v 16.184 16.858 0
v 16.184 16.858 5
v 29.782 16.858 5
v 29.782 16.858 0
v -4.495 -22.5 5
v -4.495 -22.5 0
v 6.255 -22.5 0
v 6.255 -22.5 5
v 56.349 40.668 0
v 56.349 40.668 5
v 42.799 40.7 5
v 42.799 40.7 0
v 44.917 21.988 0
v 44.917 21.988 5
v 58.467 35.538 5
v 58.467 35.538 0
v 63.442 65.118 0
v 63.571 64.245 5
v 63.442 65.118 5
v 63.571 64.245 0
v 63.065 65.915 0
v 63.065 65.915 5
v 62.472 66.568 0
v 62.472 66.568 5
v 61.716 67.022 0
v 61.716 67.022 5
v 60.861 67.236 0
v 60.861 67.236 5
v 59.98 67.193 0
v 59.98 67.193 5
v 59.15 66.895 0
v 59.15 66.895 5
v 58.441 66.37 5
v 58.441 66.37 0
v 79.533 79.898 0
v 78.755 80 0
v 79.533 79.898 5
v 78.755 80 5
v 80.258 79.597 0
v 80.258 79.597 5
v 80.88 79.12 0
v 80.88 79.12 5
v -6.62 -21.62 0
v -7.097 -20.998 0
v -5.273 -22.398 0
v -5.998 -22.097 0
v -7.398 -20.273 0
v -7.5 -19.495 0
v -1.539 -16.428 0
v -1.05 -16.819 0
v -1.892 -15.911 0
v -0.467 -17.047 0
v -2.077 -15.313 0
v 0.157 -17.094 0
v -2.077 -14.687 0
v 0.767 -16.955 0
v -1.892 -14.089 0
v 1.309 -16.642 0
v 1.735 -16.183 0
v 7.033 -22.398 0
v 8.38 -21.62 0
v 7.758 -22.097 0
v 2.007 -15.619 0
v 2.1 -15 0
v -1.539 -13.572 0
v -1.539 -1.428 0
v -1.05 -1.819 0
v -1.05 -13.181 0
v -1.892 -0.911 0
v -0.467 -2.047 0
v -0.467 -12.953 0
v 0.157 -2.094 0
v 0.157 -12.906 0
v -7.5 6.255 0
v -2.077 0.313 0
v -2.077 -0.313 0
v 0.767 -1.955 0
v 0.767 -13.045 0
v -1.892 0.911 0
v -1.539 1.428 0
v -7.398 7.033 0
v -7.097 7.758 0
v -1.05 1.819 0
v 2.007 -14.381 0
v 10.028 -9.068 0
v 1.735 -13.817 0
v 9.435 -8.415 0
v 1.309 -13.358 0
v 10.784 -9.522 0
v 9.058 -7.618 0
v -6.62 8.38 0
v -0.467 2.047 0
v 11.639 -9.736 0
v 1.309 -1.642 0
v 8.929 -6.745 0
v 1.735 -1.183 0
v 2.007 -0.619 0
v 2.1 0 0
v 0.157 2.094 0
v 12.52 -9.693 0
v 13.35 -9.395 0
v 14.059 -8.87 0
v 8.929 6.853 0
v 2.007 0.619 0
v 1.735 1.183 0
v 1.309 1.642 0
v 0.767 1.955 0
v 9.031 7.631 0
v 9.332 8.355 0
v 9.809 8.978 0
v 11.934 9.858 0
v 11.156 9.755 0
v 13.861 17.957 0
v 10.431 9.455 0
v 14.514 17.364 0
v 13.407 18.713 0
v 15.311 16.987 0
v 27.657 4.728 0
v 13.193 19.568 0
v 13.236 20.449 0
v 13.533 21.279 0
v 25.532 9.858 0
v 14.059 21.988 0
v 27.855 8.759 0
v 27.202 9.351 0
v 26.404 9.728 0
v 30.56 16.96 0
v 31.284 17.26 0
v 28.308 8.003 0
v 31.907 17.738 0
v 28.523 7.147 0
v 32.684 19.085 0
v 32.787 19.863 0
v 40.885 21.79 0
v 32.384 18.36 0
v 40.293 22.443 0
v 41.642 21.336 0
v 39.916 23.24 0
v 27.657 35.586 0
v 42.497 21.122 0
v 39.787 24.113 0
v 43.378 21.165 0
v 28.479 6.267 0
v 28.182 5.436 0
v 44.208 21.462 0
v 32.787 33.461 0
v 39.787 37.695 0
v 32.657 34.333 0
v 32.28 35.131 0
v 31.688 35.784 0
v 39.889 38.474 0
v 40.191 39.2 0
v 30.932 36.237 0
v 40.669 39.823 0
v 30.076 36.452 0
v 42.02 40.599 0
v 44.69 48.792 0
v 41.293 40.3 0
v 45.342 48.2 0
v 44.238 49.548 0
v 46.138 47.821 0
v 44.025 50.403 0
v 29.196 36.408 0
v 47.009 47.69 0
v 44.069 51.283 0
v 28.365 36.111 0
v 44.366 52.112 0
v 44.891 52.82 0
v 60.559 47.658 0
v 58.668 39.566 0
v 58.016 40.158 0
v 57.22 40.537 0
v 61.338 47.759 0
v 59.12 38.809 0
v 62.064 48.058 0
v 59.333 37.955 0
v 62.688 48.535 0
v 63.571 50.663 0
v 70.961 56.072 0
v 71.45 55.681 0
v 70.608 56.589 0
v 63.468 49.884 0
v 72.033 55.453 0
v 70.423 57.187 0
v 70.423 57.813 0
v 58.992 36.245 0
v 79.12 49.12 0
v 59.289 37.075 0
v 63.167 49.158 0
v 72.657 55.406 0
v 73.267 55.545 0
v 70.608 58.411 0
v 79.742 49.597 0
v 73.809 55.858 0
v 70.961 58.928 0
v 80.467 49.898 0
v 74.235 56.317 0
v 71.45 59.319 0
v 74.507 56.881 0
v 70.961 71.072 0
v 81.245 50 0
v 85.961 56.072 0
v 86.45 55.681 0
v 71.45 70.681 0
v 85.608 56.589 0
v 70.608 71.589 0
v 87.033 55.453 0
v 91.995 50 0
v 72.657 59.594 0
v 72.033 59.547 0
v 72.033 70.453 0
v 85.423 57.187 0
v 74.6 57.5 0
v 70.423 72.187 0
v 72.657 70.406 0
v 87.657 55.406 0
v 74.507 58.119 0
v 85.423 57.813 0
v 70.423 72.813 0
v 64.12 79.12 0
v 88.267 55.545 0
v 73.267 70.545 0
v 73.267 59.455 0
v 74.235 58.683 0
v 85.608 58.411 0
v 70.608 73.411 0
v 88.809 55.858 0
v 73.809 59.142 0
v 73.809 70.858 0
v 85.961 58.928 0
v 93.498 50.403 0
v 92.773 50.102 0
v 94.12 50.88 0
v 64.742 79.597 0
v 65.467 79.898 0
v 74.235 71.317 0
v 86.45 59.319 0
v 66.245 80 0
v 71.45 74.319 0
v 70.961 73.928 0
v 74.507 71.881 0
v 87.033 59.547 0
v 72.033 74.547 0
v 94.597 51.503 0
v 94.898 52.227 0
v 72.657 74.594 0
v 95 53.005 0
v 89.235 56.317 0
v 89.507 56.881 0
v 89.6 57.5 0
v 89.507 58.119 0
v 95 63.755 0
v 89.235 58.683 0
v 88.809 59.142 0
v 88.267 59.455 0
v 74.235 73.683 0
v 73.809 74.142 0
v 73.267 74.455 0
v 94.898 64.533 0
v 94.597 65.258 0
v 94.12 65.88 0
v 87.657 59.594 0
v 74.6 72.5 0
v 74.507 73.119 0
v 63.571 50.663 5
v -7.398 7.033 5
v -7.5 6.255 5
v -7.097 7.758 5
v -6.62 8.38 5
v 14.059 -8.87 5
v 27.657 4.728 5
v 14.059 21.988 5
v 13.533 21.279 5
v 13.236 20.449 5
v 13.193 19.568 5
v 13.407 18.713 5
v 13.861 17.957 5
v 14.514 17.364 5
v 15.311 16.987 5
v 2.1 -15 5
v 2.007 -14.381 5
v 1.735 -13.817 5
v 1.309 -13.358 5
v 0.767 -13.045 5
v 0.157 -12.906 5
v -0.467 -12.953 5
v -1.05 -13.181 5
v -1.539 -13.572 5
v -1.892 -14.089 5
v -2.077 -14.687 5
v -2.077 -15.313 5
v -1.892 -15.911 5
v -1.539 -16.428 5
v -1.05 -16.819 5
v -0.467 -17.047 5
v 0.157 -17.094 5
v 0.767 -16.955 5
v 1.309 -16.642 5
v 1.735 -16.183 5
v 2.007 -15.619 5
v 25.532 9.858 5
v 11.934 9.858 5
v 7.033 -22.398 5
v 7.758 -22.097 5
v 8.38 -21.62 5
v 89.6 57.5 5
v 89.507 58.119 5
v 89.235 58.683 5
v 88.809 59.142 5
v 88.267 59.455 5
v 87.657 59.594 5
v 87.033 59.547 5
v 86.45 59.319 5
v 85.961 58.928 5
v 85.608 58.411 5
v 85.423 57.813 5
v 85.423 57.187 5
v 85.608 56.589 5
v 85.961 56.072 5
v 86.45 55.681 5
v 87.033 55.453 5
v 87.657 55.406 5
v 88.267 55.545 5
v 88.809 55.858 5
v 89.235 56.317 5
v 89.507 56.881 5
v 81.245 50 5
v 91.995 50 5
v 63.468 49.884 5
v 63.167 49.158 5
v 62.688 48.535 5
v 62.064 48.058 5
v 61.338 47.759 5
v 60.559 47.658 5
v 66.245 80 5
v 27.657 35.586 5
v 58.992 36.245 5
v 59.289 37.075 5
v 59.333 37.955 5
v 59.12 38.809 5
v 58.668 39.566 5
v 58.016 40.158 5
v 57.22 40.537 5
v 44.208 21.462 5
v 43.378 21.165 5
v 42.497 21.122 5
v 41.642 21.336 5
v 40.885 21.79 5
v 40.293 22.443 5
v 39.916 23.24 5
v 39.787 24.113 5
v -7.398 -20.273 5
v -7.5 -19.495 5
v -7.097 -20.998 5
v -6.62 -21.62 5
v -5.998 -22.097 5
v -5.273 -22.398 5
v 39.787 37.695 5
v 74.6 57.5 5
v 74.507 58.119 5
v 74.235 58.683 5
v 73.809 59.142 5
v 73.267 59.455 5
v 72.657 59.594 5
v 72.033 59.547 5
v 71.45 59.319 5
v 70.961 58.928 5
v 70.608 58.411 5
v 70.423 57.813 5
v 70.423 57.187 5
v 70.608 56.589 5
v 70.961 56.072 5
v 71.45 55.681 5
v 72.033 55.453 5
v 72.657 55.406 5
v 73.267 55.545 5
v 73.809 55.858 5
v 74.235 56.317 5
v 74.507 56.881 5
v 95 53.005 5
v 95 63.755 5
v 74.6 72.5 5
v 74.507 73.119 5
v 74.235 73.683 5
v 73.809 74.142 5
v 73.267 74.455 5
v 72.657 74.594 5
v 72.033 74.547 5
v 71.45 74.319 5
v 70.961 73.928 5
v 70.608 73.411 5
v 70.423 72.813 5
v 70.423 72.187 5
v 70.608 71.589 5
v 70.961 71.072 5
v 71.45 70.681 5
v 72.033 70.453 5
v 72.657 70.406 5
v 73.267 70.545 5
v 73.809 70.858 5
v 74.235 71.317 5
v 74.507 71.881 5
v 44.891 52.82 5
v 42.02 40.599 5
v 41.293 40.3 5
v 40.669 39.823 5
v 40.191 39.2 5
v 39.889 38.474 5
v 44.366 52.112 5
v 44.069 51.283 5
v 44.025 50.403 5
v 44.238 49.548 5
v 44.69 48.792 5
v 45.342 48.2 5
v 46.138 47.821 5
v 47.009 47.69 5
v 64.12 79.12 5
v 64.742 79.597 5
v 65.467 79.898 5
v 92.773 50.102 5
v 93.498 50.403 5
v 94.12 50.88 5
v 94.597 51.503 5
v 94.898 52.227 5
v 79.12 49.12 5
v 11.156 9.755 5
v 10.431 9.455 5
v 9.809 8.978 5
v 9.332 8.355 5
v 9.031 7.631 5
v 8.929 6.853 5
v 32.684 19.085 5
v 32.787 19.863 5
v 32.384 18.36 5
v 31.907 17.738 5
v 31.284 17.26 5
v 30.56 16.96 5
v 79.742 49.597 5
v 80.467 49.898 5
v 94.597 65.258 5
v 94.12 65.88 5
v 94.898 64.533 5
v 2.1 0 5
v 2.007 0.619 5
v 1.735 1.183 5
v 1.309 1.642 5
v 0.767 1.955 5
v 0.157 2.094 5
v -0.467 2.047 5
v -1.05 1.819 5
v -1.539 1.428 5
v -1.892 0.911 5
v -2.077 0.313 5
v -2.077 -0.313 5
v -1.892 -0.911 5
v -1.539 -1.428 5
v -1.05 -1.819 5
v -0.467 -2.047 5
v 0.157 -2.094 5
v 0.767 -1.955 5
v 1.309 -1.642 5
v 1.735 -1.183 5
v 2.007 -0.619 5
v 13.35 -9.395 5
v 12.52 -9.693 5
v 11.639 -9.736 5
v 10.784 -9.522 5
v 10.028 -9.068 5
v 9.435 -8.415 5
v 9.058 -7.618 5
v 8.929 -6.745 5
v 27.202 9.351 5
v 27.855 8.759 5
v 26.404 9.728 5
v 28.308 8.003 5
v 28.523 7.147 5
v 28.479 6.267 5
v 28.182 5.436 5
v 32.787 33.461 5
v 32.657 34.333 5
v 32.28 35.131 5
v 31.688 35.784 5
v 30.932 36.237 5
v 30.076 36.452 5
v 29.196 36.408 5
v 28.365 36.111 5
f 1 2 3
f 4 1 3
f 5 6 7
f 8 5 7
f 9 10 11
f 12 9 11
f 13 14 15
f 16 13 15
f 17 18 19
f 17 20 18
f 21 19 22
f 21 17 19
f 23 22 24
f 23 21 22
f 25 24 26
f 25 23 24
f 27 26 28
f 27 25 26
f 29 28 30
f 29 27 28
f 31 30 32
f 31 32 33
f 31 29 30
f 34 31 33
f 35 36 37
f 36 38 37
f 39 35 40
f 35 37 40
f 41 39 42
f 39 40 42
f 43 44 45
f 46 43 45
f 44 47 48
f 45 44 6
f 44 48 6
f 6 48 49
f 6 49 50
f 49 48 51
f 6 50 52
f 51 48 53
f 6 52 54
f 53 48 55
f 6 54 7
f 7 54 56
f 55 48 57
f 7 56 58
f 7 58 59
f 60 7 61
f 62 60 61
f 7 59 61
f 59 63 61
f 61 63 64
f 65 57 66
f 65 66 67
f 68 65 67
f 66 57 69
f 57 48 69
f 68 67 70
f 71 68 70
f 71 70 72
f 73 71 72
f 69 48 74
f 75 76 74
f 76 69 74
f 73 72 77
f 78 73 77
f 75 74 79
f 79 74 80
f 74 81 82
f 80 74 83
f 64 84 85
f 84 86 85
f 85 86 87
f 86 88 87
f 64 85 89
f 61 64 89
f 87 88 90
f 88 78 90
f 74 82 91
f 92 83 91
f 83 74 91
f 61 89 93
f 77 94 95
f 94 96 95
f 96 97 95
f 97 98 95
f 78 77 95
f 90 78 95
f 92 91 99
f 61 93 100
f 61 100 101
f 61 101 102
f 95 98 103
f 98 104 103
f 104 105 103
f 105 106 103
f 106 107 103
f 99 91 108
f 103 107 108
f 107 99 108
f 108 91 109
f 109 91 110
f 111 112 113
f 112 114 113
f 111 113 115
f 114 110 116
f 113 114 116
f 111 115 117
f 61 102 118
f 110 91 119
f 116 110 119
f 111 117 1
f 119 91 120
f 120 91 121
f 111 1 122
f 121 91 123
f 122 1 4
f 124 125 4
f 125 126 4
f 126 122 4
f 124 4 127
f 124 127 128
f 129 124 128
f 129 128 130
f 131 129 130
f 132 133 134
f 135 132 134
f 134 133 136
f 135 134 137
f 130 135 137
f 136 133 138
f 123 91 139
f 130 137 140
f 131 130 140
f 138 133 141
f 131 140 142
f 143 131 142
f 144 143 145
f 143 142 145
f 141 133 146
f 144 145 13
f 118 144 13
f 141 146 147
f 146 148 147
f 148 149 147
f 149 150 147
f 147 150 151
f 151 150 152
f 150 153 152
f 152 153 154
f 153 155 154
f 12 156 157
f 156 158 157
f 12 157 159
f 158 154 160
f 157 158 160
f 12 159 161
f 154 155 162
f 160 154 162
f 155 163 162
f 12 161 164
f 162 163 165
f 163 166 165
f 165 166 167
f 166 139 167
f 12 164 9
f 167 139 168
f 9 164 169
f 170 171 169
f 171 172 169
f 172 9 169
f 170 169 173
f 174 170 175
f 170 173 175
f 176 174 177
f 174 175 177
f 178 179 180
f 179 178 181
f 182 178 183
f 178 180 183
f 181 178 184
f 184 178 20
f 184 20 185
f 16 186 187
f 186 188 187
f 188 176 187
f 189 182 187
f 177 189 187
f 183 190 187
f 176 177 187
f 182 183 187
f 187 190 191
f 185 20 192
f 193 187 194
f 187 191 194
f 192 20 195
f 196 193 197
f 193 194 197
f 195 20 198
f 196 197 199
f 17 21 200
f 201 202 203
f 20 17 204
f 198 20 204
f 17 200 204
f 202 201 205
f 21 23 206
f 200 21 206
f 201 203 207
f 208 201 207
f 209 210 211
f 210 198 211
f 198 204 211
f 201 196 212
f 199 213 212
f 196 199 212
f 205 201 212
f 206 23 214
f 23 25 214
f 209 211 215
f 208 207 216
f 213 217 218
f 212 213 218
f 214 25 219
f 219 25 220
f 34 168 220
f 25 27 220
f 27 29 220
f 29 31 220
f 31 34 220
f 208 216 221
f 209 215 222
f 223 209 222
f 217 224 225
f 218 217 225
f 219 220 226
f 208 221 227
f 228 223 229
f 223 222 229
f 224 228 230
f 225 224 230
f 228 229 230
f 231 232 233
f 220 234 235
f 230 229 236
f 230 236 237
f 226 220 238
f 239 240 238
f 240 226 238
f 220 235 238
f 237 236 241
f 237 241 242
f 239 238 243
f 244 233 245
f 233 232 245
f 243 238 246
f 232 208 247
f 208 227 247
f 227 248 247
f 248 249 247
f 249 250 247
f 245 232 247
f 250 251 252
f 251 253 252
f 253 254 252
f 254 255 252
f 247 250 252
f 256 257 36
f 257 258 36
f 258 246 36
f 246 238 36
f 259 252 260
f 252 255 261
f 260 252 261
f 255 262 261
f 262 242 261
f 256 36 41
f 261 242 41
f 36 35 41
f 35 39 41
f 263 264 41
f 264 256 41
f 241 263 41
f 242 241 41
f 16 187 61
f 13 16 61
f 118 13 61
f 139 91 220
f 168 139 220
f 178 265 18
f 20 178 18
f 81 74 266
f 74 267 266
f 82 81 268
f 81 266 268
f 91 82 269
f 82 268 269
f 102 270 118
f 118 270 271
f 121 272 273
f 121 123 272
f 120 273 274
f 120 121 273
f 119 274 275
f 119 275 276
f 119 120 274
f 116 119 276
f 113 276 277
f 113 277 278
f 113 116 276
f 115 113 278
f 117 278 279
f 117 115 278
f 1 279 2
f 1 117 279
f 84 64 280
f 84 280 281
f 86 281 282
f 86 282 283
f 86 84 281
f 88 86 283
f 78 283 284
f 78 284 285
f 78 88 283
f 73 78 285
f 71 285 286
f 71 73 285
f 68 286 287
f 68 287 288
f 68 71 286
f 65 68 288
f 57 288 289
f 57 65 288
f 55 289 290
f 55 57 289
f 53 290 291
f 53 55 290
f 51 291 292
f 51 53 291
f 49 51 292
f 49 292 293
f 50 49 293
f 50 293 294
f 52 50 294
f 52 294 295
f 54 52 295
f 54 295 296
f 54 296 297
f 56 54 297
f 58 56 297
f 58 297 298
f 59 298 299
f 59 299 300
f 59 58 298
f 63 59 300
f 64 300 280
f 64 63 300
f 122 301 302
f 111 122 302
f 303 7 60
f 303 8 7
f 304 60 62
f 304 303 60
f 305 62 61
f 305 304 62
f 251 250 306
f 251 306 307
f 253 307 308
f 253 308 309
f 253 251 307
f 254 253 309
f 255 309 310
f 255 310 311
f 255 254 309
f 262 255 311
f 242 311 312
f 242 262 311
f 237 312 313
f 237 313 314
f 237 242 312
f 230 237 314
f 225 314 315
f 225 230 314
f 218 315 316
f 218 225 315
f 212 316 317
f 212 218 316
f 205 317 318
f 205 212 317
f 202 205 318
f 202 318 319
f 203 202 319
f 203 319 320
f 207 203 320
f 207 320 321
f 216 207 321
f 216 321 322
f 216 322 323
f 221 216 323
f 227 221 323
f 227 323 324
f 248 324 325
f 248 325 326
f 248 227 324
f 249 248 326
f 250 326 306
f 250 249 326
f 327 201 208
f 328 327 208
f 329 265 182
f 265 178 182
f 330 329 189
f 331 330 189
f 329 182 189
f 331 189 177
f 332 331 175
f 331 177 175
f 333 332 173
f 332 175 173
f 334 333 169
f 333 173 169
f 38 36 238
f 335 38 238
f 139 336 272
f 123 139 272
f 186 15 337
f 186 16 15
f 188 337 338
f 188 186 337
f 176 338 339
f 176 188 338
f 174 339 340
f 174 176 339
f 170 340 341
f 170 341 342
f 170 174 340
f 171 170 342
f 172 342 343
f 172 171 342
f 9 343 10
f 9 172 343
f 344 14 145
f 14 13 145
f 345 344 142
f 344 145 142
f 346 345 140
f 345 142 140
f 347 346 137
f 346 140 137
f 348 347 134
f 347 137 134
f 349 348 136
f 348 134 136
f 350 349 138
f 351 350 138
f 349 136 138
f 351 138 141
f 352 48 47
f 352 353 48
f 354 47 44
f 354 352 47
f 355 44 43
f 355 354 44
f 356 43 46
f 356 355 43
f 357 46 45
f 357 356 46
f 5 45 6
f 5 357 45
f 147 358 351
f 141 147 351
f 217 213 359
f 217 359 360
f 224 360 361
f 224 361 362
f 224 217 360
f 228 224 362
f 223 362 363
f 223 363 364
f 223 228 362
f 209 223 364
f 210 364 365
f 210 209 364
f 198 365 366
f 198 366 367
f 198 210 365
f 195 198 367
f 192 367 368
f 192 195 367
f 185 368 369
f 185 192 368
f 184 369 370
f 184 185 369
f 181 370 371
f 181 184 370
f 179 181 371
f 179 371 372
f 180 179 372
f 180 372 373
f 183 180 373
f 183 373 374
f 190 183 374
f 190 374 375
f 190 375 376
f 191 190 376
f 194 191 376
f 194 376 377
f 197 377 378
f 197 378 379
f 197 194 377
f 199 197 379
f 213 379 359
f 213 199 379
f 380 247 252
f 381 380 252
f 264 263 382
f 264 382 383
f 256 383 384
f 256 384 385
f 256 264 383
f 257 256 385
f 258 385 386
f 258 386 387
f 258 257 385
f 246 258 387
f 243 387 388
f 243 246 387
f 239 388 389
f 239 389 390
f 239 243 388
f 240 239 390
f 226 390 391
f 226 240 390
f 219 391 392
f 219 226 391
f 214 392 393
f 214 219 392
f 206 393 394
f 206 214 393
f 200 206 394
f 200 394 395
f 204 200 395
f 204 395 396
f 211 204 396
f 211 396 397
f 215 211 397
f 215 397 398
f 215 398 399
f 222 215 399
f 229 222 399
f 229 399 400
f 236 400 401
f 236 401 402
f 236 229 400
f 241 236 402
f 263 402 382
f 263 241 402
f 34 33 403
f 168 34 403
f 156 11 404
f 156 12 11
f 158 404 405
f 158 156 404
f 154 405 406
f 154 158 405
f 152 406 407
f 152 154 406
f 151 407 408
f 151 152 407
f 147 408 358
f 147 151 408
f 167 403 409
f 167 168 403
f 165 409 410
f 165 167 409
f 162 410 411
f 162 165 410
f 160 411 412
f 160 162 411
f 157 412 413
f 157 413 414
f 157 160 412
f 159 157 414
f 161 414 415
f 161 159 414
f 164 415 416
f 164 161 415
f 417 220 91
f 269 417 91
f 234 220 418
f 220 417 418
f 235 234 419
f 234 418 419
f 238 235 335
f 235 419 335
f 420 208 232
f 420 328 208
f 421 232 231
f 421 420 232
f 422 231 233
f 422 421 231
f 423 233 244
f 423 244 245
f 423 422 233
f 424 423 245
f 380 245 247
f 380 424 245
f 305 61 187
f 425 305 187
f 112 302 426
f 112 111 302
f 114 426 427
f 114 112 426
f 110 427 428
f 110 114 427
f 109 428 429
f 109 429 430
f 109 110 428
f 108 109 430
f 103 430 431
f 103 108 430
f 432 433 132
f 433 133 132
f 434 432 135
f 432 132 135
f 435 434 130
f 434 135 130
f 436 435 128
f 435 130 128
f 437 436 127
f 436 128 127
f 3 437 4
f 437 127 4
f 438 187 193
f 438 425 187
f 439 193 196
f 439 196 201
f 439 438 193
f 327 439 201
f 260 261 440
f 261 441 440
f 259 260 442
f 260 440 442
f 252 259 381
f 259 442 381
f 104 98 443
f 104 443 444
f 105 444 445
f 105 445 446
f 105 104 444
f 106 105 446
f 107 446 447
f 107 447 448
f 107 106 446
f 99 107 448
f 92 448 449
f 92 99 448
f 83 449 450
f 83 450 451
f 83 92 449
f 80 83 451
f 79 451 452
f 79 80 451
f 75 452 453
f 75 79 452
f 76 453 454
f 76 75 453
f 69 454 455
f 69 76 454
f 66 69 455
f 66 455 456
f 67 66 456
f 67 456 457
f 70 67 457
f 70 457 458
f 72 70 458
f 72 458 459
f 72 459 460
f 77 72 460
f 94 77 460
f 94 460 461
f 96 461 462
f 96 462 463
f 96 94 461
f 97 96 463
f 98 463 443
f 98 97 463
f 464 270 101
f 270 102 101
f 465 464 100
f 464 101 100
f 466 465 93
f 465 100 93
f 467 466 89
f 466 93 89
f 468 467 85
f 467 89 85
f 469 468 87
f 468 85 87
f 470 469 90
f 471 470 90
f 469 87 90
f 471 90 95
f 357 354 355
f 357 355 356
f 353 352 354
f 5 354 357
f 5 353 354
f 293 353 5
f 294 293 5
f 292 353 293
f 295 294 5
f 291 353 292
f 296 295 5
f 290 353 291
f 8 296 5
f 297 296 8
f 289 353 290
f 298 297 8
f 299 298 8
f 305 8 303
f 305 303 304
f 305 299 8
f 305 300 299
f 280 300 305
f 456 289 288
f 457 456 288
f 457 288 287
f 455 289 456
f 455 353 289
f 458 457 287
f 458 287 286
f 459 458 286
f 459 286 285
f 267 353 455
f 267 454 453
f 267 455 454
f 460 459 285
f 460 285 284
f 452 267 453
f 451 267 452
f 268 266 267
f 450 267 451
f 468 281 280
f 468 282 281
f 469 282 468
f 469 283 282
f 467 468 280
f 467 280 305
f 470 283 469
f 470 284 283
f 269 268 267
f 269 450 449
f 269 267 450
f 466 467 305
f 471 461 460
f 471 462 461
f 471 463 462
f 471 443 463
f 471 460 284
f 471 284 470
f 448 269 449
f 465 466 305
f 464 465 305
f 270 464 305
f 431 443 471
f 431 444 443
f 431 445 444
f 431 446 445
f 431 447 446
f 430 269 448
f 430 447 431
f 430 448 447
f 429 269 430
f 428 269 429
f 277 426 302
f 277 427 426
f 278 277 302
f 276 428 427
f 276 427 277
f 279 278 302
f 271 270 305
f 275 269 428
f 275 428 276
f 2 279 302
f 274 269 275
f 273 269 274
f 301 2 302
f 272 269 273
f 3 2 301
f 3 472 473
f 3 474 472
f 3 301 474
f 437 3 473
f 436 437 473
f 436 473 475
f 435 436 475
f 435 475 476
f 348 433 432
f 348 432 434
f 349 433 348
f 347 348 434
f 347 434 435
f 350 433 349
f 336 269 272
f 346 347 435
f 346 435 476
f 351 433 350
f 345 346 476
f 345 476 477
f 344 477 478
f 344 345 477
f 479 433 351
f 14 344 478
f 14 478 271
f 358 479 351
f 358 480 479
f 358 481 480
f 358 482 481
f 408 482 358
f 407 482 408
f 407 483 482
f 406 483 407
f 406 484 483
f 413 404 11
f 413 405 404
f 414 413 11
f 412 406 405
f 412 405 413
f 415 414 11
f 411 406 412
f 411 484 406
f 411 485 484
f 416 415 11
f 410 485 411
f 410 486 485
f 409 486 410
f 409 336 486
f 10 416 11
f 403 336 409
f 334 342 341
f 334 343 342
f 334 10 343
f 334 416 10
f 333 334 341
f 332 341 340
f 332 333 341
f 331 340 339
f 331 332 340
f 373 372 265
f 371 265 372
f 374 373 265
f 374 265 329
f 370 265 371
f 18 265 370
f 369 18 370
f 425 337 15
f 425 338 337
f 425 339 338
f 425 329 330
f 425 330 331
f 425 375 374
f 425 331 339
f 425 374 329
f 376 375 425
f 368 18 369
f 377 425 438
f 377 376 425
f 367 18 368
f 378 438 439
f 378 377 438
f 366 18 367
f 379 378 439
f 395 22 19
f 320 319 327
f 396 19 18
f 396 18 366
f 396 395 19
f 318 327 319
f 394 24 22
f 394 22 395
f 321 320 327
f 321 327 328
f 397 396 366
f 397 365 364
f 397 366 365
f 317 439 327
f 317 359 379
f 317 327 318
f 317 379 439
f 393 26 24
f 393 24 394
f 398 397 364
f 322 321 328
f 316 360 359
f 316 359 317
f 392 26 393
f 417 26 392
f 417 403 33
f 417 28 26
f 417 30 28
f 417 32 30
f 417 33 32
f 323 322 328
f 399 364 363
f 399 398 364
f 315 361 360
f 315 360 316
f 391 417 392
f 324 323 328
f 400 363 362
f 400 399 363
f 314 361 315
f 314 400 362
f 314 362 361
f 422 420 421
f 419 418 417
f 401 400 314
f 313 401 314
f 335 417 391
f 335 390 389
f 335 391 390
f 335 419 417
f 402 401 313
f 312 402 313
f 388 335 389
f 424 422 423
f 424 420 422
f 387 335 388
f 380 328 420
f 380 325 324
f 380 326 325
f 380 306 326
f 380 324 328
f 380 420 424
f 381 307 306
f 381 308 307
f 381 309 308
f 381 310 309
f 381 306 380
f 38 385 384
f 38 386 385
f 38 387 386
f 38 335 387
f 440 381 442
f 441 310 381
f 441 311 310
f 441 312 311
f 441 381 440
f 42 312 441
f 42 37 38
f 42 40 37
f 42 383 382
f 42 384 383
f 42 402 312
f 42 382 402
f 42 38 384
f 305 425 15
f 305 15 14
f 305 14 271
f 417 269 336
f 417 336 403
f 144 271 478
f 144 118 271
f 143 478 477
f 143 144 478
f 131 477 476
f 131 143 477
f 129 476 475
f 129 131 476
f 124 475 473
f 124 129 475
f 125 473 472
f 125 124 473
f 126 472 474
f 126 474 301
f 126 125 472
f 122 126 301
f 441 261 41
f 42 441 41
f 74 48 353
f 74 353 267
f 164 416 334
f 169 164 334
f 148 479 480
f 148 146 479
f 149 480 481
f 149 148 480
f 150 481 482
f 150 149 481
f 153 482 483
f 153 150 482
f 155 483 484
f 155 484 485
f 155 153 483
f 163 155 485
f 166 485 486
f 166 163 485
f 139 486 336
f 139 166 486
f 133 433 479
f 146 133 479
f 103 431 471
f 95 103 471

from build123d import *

# Parameters (mm, degrees)
SKETCH_1_R          = 2.1
SKETCH_1_W          = 15
SKETCH_1_H          = 15
EXTRUDE_1_DEPTH     = 5
CUT_EXTRUDE_1_DEPTH = 125.298028947
FILLET_1_R          = 3.005
FILLET_2_R          = 3.005


with BuildPart() as part:
    # ｽｹｯﾁ1 → ﾎﾞｽ - 押し出し1 (new body)
    # profile 1 of 3: a face of its own
    with BuildSketch(Plane.XY):
        Polygon((7.5, -7.5), (7.5, -22.5), (22.5, -7.5), (80, 50), (95, 50), (95, 65), (80, 80), (65, 80), (-7.5, 7.5), (7.5, 7.5), align=None)
        with Locations((72.5, 57.5)):
            Circle(SKETCH_1_R, mode=Mode.SUBTRACT)
        with Locations((87.5, 57.5)):
            Circle(SKETCH_1_R, mode=Mode.SUBTRACT)
        with Locations((72.5, 72.5)):
            Circle(SKETCH_1_R, mode=Mode.SUBTRACT)
    # profile 2 of 3: a face of its own
    with BuildSketch(Plane.XY):
        with Locations((0, -15)):
            Rectangle(SKETCH_1_W, SKETCH_1_H)
        with Locations((0, -15)):
            Circle(SKETCH_1_R, mode=Mode.SUBTRACT)
    # profile 3 of 3: a face of its own
    with BuildSketch(Plane.XY):
        Rectangle(SKETCH_1_W, SKETCH_1_H)
        Circle(SKETCH_1_R, mode=Mode.SUBTRACT)
    extrude(amount=EXTRUDE_1_DEPTH)

    # ｽｹｯﾁ2 → ｶｯﾄ - 押し出し1 (cut, through all)
    with BuildSketch(Plane.XY.offset(5)):
        Polygon((8.928932188, -14), (32.786796564, 9.857864376), (8.928932188, 9.857864376), align=None)
        Polygon((32.786796564, 16.857864376), (32.786796564, 40.715728753), (8.928932188, 16.857864376), align=None)
        Polygon((39.786796564, 16.857864376), (63.579405008, 40.65047282), (39.786796564, 40.707351623), align=None)
        Polygon((63.571067812, 47.650512753), (63.571067812, 71.5), (39.778459368, 47.707391556), align=None)
    extrude(amount=-CUT_EXTRUDE_1_DEPTH, mode=Mode.SUBTRACT)

    # ﾌｨﾚｯﾄ1
    fillet_1_edges = [part.edges().sort_by_distance(p)[0] for p in [
        (8.928932188, 9.857864376, 2.5),
        (32.786796564, 9.857864376, 2.5),
        (8.928932188, -14, 2.5),
        (32.786796564, 16.857864376, 2.5),
        (8.928932188, 16.857864376, 2.5),
        (32.786796564, 40.715728753, 2.5),
        (39.786796564, 40.707351623, 2.5),
        (63.579405008, 40.65047282, 2.5),
        (39.786796564, 16.857864376, 2.5),
        (63.571067812, 71.5, 2.5),
        (63.571067812, 47.650512753, 2.5),
        (39.778459368, 47.707391556, 2.5),
    ]]
    fillet(fillet_1_edges, radius=FILLET_1_R)

    # ﾌｨﾚｯﾄ2
    fillet_2_edges = [part.edges().sort_by_distance(p)[0] for p in [
        (-7.5, 7.5, 2.5),
        (65, 80, 2.5),
        (80, 80, 2.5),
        (95, 65, 2.5),
        (95, 50, 2.5),
        (80, 50, 2.5),
        (7.5, -22.5, 2.5),
        (-7.5, -22.5, 2.5),
    ]]
    fillet(fillet_2_edges, radius=FILLET_2_R)


solid = part.part
